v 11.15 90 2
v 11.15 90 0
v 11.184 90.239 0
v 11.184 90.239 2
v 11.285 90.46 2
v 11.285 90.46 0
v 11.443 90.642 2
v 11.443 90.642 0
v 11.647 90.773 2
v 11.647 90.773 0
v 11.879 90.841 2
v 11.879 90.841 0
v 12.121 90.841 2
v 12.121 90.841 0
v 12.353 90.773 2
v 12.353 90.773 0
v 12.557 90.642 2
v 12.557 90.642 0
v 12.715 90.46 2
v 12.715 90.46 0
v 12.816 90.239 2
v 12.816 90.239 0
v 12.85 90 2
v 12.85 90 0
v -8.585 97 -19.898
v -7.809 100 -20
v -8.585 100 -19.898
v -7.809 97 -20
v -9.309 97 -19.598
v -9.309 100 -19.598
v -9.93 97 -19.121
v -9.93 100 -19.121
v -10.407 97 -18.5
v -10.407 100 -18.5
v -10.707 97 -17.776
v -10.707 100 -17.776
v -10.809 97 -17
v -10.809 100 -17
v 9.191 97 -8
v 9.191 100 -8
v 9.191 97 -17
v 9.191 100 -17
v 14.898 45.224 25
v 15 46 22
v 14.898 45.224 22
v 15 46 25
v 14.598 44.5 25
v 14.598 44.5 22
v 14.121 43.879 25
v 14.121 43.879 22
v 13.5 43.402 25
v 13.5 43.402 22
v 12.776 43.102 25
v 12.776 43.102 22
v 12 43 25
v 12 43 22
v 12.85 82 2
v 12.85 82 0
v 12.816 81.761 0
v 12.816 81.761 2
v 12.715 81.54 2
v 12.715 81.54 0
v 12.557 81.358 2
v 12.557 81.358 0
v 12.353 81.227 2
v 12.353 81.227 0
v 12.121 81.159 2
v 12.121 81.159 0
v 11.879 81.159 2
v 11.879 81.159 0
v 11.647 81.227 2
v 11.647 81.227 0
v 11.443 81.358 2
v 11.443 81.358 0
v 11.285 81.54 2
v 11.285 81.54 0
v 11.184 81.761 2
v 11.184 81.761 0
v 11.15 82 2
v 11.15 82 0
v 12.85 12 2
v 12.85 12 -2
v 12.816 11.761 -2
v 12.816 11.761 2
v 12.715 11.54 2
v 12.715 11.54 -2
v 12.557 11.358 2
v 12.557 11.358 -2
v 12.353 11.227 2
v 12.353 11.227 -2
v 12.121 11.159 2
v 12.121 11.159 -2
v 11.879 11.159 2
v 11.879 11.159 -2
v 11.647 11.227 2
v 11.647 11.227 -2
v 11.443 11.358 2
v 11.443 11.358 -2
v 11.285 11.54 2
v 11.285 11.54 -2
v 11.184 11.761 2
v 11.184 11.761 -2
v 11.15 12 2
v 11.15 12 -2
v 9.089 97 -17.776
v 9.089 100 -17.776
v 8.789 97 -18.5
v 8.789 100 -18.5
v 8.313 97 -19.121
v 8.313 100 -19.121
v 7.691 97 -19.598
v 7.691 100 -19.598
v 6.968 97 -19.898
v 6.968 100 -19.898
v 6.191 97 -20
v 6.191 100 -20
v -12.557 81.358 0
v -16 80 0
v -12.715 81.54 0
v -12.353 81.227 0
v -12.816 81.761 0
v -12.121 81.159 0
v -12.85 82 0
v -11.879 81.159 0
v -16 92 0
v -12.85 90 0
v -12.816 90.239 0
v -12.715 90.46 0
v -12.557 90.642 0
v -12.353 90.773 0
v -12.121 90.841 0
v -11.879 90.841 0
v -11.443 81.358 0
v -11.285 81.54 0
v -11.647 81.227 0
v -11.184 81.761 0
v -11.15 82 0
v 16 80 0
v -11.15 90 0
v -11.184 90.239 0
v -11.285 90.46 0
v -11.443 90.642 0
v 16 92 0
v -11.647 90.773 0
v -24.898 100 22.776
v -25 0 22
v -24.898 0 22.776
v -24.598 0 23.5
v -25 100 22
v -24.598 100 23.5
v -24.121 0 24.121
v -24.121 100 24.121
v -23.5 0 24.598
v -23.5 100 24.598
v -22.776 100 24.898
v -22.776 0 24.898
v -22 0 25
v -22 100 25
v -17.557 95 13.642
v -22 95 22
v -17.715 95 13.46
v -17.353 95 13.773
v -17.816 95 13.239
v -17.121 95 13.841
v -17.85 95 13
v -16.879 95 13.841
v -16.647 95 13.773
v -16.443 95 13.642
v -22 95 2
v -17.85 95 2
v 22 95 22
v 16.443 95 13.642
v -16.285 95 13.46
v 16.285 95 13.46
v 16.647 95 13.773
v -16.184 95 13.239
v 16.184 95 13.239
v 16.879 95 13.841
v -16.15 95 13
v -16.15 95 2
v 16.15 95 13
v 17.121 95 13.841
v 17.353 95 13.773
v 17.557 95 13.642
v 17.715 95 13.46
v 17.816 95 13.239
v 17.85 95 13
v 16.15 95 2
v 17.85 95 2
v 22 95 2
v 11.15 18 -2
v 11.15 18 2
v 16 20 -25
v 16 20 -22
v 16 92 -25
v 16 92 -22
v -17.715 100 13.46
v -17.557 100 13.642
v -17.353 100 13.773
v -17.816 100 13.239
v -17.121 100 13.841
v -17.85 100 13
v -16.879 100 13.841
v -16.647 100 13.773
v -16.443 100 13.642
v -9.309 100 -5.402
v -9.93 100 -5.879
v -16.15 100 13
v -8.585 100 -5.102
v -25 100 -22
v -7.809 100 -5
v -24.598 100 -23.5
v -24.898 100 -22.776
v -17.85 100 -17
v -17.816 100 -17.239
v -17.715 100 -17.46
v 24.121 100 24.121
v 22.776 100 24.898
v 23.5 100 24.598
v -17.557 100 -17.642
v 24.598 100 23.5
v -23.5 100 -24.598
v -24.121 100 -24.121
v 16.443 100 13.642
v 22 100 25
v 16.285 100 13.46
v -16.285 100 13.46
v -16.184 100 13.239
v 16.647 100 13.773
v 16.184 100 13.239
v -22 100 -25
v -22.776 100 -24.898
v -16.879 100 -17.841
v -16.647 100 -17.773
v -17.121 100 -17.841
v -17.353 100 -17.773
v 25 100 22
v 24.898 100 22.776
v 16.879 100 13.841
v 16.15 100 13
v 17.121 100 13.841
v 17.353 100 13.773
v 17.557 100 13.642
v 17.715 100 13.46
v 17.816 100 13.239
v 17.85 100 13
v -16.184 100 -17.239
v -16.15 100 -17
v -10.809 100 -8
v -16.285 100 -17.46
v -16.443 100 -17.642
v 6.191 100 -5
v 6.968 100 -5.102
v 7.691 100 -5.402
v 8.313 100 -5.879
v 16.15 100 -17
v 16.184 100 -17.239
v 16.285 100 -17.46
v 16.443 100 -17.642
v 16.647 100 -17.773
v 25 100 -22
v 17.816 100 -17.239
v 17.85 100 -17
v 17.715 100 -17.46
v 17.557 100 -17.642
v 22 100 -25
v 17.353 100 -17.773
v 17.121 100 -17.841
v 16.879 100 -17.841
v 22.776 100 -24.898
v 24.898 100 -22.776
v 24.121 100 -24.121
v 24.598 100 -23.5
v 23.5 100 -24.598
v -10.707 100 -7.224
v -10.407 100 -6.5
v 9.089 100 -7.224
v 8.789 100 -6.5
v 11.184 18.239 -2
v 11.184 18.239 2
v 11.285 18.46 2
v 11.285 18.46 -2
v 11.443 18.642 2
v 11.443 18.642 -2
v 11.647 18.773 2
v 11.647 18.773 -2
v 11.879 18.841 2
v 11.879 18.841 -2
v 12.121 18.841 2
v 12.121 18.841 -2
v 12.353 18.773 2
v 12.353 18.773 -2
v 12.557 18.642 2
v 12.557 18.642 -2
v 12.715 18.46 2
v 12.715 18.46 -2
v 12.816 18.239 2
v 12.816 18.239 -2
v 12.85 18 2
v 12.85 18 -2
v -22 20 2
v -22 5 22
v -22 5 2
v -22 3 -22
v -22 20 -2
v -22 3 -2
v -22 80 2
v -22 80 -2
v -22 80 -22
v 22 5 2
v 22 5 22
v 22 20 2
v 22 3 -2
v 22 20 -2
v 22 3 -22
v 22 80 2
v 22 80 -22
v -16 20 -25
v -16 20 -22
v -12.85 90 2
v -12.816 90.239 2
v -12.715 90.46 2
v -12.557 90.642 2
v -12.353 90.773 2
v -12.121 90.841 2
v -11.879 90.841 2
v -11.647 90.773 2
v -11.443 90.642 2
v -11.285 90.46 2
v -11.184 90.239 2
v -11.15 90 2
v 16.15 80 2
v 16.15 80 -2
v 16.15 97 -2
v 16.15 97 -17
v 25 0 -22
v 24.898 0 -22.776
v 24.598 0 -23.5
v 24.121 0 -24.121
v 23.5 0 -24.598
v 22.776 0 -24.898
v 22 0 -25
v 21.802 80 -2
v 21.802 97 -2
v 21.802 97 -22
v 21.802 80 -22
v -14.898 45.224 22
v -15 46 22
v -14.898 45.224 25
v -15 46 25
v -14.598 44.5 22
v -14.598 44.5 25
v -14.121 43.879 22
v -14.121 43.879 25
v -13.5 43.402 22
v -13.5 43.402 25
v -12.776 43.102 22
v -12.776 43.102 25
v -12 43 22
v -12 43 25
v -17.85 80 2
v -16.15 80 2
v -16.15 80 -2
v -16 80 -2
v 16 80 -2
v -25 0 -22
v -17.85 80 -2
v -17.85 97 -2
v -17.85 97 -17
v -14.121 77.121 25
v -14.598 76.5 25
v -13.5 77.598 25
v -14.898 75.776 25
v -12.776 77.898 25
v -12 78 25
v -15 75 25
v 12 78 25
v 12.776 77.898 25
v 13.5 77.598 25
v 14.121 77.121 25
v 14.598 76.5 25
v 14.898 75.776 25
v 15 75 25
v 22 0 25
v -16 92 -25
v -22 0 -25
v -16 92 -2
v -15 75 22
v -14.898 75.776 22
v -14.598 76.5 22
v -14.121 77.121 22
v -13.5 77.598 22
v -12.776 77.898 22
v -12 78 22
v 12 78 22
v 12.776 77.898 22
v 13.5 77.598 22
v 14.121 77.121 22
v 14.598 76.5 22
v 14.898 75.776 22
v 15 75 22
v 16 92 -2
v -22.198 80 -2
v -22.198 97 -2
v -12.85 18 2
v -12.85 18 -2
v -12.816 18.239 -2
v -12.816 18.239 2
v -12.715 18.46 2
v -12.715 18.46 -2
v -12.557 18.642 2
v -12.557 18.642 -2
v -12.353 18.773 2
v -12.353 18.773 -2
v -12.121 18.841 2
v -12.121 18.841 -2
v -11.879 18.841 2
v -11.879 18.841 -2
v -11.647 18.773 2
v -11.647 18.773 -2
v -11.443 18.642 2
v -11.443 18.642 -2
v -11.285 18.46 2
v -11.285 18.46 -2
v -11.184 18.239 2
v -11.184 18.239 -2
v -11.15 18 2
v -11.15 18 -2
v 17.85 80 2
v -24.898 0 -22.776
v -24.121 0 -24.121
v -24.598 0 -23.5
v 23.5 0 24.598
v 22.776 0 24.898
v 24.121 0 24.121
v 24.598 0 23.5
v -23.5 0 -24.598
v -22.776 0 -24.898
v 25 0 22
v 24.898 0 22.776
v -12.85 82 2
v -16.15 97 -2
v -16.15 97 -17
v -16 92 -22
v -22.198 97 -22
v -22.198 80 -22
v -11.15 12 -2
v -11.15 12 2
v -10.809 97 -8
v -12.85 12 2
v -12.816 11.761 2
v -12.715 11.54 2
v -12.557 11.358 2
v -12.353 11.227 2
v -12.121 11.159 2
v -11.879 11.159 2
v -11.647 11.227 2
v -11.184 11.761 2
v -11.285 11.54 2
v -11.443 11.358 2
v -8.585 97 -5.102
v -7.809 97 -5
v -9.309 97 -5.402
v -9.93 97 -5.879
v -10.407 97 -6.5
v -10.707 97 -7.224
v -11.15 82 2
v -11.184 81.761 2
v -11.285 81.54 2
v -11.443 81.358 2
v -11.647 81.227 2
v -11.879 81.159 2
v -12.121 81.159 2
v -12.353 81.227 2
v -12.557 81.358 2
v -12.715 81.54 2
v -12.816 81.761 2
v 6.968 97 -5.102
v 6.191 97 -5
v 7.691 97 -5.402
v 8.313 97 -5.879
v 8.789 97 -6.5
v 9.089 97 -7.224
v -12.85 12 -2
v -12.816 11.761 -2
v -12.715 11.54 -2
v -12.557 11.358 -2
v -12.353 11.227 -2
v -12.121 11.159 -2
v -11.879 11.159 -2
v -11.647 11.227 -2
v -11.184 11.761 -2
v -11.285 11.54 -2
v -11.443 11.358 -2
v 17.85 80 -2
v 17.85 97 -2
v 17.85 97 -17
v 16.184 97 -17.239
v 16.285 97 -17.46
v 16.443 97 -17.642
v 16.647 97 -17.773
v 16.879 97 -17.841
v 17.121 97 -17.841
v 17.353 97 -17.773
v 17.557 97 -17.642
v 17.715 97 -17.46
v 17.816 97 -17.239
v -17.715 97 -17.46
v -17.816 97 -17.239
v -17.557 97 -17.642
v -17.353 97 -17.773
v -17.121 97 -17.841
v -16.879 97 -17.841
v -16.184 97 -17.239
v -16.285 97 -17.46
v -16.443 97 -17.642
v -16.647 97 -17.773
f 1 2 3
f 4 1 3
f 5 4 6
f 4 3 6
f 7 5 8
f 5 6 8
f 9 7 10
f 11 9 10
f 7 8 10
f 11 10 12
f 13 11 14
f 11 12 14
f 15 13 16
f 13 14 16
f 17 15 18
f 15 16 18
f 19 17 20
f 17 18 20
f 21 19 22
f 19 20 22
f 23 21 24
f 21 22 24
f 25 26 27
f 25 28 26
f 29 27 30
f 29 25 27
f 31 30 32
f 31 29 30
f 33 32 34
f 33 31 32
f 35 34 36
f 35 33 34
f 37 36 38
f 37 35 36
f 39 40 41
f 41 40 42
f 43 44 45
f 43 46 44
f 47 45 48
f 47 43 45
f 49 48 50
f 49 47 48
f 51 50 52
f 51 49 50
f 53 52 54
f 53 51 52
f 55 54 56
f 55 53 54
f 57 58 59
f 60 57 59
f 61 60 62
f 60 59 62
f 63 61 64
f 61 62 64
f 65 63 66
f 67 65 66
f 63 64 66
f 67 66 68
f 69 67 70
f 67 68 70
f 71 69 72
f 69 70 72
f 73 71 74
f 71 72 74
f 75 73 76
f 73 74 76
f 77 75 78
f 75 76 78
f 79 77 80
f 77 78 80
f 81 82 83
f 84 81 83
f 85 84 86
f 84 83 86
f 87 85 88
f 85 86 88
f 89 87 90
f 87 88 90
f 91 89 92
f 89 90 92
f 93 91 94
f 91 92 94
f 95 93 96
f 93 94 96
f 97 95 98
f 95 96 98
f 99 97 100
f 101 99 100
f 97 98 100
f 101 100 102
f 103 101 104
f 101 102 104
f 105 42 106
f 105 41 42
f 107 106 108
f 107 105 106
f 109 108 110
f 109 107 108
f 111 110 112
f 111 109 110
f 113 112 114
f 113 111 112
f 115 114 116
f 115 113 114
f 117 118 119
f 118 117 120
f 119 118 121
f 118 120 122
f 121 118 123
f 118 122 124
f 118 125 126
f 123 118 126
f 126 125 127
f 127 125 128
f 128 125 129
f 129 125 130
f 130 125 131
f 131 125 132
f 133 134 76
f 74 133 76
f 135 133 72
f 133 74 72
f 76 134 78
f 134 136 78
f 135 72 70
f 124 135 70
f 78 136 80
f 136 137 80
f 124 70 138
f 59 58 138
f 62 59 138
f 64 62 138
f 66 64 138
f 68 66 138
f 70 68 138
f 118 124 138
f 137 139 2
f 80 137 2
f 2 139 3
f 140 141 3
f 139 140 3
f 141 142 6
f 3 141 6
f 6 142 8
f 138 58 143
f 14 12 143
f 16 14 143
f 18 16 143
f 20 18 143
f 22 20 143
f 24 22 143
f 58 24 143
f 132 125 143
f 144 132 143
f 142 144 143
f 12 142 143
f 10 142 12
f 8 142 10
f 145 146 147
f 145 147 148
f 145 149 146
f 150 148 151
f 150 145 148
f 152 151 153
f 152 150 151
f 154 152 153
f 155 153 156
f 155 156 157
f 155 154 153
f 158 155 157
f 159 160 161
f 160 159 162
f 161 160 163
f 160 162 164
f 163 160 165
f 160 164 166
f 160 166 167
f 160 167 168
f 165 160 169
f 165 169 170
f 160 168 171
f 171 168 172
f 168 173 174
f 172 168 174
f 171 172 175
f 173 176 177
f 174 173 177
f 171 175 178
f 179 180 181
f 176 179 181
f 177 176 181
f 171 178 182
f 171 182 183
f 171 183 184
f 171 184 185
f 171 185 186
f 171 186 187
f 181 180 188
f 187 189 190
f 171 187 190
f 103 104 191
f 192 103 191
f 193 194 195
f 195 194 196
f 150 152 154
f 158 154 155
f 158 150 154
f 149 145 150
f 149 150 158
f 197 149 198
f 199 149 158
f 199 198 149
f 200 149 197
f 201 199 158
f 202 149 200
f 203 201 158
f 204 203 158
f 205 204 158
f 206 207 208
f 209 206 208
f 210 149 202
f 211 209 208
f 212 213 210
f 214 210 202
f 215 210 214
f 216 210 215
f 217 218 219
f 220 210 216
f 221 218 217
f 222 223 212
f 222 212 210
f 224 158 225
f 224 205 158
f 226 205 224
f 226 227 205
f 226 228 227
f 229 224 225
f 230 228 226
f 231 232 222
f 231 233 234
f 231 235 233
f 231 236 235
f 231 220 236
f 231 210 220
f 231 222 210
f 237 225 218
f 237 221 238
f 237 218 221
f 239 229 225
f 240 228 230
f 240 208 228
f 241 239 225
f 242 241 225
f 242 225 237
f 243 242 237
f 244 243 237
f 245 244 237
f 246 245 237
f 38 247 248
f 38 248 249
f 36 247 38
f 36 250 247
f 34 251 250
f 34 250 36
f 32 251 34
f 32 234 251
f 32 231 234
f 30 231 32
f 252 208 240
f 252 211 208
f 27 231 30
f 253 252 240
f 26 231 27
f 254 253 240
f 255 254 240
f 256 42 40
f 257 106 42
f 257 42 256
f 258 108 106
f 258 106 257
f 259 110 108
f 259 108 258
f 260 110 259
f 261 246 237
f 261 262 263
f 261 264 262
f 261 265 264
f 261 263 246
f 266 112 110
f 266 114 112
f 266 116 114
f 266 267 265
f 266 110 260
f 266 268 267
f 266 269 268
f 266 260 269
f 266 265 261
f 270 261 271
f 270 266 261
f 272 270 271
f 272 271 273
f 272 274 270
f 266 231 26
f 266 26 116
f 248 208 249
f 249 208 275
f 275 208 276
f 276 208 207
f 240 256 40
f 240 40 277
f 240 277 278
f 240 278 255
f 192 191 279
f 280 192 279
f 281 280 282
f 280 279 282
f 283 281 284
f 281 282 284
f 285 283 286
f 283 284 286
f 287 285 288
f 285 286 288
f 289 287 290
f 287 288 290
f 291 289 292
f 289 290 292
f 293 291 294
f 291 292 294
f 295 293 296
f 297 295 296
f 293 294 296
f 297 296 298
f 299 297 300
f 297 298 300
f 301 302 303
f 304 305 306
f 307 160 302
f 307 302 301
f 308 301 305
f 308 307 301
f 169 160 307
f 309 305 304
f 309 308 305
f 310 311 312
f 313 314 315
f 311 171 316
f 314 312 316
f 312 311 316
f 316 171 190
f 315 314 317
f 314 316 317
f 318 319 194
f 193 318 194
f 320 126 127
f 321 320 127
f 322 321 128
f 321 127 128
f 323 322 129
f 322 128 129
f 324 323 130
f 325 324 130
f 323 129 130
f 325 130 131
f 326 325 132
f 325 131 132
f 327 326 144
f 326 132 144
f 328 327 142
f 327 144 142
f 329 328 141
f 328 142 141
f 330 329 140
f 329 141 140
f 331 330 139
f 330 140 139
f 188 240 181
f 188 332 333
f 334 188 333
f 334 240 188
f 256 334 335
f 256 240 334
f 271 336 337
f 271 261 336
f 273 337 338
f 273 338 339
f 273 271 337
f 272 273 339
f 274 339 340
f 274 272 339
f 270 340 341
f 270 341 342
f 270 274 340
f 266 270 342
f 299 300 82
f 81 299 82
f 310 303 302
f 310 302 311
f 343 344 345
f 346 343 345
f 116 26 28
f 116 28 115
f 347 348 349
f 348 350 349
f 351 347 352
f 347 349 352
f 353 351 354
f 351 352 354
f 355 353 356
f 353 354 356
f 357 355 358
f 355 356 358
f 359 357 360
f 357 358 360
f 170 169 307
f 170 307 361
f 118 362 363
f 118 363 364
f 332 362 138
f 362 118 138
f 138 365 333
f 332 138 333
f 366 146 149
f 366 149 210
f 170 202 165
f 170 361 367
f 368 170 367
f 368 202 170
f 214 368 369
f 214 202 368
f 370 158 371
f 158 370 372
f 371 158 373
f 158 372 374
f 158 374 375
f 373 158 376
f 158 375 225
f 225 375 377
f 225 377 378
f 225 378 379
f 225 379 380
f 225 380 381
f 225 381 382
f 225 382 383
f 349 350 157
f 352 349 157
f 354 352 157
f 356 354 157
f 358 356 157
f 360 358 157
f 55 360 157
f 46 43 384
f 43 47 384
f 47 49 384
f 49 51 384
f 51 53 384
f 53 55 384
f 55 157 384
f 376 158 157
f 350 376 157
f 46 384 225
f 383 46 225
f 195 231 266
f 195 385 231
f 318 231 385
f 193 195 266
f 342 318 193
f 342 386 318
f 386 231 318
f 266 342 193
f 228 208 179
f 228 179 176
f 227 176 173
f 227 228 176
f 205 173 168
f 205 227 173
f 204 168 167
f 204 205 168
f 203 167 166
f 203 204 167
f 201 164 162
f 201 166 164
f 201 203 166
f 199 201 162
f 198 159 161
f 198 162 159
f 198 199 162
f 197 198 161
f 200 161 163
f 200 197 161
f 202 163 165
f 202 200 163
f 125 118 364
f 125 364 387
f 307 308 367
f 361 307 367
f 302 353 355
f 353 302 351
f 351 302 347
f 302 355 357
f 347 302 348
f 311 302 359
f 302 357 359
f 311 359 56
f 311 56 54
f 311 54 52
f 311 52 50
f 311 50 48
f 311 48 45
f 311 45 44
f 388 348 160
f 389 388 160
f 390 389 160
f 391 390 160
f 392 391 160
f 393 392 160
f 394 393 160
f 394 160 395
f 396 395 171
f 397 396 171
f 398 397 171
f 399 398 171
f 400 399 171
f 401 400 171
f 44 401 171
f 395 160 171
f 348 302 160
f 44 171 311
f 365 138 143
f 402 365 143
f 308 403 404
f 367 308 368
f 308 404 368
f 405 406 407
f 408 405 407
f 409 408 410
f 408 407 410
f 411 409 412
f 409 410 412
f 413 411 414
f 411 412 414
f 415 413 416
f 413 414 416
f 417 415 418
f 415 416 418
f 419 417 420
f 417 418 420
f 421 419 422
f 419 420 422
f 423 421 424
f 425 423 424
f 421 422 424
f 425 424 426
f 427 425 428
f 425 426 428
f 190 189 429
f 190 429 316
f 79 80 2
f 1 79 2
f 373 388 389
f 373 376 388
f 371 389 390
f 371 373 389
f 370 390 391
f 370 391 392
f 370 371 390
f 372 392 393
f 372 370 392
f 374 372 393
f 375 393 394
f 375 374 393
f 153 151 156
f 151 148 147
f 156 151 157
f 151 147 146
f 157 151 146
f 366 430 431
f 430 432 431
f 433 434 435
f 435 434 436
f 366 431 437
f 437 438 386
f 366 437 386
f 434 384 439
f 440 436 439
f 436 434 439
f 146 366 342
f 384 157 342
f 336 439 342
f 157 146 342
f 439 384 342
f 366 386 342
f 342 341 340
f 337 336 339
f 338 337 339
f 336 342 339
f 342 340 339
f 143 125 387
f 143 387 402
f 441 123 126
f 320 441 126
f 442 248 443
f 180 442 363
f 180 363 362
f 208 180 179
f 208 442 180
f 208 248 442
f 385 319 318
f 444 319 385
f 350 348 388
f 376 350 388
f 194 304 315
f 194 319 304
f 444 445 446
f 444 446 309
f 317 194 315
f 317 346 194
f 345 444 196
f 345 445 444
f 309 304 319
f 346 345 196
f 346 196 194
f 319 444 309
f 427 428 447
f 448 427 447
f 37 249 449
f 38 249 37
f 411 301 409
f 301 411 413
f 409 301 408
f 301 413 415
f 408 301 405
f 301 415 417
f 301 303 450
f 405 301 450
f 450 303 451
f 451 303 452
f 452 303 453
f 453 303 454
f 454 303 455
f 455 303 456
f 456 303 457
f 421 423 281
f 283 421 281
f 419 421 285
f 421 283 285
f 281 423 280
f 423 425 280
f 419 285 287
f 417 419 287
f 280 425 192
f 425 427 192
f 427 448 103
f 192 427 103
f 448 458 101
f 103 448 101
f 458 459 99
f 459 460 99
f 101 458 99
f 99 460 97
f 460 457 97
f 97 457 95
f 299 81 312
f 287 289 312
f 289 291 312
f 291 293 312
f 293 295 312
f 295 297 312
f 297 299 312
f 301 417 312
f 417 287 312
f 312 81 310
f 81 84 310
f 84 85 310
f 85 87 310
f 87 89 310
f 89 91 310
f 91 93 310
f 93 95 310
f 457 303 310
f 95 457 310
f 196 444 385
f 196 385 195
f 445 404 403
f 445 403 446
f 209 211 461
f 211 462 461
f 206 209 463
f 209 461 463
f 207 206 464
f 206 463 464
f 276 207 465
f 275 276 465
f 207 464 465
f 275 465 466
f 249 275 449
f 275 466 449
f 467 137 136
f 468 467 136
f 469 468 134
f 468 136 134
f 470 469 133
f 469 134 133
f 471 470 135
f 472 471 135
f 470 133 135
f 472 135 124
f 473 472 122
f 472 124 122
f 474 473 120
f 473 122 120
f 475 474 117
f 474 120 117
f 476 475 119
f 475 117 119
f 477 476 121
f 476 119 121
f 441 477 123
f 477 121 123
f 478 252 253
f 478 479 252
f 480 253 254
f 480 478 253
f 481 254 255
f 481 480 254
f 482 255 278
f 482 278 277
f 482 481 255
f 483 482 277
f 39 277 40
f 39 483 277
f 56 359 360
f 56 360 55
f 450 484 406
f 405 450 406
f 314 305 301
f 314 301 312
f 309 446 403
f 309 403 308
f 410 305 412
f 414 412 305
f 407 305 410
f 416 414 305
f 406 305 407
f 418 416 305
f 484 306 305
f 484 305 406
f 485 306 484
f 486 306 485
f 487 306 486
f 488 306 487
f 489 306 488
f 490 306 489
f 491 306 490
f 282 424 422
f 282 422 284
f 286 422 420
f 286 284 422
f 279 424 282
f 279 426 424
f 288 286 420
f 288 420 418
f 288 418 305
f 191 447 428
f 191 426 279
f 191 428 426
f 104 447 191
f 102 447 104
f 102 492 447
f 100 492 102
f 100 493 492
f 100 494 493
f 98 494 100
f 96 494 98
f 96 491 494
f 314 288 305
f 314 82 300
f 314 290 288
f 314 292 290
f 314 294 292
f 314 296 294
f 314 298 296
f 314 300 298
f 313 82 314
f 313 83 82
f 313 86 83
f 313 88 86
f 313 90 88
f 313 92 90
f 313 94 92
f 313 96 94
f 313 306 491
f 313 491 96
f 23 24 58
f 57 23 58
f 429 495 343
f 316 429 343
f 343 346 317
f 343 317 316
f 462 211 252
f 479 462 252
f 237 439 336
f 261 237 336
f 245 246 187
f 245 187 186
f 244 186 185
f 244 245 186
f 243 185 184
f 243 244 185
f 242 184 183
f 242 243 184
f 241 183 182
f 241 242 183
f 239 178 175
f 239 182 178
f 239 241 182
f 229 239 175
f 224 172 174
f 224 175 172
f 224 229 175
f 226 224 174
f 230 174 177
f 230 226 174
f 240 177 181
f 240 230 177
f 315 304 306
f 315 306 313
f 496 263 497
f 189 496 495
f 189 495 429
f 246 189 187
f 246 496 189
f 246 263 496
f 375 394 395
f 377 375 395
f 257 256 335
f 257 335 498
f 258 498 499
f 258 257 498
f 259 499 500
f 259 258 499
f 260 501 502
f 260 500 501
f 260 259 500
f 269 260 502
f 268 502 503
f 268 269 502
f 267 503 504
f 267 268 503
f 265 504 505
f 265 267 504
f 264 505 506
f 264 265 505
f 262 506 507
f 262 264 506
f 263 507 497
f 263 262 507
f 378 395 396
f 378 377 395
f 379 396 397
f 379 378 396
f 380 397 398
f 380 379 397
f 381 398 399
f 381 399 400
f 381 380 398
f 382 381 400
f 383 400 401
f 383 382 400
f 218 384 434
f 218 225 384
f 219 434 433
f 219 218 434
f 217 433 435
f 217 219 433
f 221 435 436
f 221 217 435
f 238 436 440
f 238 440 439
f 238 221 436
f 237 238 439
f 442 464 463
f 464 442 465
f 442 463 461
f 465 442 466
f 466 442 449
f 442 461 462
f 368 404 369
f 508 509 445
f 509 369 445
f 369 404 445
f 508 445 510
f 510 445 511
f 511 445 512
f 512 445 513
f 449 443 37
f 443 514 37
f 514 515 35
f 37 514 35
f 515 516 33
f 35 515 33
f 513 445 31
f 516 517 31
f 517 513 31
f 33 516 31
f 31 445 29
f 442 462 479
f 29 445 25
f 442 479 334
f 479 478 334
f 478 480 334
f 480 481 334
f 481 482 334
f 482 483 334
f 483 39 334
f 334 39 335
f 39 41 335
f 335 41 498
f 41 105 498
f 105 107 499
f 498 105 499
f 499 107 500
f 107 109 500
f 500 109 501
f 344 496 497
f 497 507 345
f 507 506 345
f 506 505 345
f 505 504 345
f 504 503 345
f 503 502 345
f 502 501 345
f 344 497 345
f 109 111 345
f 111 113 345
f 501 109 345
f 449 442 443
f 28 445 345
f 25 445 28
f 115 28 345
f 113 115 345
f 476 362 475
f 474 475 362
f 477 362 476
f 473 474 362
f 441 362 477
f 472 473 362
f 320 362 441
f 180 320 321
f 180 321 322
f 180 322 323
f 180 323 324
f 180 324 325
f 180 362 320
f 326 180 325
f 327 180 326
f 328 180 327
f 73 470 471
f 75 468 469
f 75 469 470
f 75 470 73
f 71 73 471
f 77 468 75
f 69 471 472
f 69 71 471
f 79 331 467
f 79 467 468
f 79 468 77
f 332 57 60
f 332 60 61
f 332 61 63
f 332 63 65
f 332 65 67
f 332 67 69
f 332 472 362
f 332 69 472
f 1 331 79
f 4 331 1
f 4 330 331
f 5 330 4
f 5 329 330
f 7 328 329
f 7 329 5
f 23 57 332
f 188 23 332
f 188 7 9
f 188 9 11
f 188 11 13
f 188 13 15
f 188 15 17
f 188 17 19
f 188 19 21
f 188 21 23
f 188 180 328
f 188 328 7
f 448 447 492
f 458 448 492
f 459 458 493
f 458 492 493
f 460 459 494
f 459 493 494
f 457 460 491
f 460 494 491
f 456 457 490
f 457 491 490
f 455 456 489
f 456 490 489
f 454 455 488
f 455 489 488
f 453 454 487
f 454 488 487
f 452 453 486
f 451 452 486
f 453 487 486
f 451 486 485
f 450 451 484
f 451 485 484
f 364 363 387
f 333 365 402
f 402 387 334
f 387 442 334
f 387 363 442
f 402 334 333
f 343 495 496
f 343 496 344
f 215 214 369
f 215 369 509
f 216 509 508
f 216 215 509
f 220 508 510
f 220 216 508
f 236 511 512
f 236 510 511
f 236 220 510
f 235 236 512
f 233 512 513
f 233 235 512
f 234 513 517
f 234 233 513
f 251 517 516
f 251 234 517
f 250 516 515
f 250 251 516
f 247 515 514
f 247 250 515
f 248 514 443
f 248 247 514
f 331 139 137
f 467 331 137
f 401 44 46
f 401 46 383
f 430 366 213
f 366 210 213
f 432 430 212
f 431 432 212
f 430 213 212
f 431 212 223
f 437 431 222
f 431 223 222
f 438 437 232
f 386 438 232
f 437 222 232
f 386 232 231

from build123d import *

# Parameters (mm, degrees)
SKETCH_1_W                = 50
SKETCH_1_H                = 50
EXTRUDE_2_DEPTH           = 100
FILLET_4_R                = 3
SKETCH_3_W                = 44
SKETCH_3_H                = 44
CUT_EXTRUDE_4_DEPTH       = 80
SKETCH_3_4_W              = 44
SKETCH_3_4_H              = 44
EXTRUDE_4_DEPTH           = 20
SKETCH_7_W                = 44
SKETCH_7_H                = 20
CUT_EXTRUDE_5_DEPTH       = 20
SKETCH_7_2_W              = 44
SKETCH_7_2_H              = 20
EXTRUDE_5_DEPTH           = 5
SKETCH_9_W                = 44
SKETCH_9_H                = 20
CUT_EXTRUDE_6_DEPTH       = 20
SKETCH_9_2_W              = 44
SKETCH_9_2_H              = 20
EXTRUDE_6_DEPTH           = 3
CUT_EXTRUDE_7_DEPTH       = 5
CUT_EXTRUDE_7_DEPTH_BACK  = 5
SKETCH_15_W               = 44
SKETCH_15_H               = 20
CUT_EXTRUDE_9_DEPTH       = 41
SKETCH_15_2_W             = 44
SKETCH_15_2_H             = 20
EXTRUDE_7_DEPTH           = 15
SKETCH_15_3_W             = 44
SKETCH_15_3_H             = 20
CUT_EXTRUDE_10_DEPTH      = 10
SKETCH_16_W               = 44
SKETCH_16_H               = 20
CUT_EXTRUDE_11_DEPTH      = 30
SKETCH_16_2_W             = 44
SKETCH_16_2_H             = 20
EXTRUDE_8_DEPTH           = 13
SKETCH_16_3_W             = 44
SKETCH_16_3_H             = 20
CUT_EXTRUDE_12_DEPTH      = 10
CUT_EXTRUDE_17_DEPTH      = 40
CUT_EXTRUDE_18_DEPTH      = 5
CUT_EXTRUDE_18_DEPTH_BACK = 4
SKETCH_21_W               = 20
SKETCH_21_H               = 15
CUT_EXTRUDE_19_DEPTH      = 44
SKETCH_23_W               = 32
SKETCH_23_H               = 72
CUT_EXTRUDE_20_DEPTH      = 44
SKETCH_25_W               = 30
SKETCH_25_H               = 35
CUT_EXTRUDE_21_DEPTH      = 40
FILLET_5_R                = 3
FILLET_6_R                = 3


with BuildPart() as part:
    # 草图1 → 凸台-拉伸2 (new body)
    with BuildSketch(Plane(origin=(0, 0, 0), x_dir=(1, 0, 0), z_dir=(0, 1, 0))):
        Rectangle(SKETCH_1_W, SKETCH_1_H)
    extrude(amount=EXTRUDE_2_DEPTH)

    # 圆角4
    fillet_4_edges = [part.edges().sort_by_distance(p)[0] for p in [
        (-25, 50, 25),
        (-25, 50, -25),
        (25, 50, -25),
        (25, 50, 25),
    ]]
    fillet(fillet_4_edges, radius=FILLET_4_R)

    # 草图3 → 切除-拉伸4 (cut)
    with BuildSketch(Plane(origin=(0, 0, 0), x_dir=(1, 0, 0), z_dir=(0, 1, 0))):
        Rectangle(SKETCH_3_W, SKETCH_3_H)
    extrude(amount=CUT_EXTRUDE_4_DEPTH, mode=Mode.SUBTRACT)

    # 草图3<4> → 凸台-拉伸4 (add)
    with BuildSketch(Plane(origin=(0, 0, 0), x_dir=(1, 0, 0), z_dir=(0, 1, 0))):
        Rectangle(SKETCH_3_4_W, SKETCH_3_4_H)
    extrude(amount=EXTRUDE_4_DEPTH)

    # 草图7 → 切除-拉伸5 (cut)
    with BuildSketch(Plane(origin=(0, 0, 0), x_dir=(1, 0, 0), z_dir=(0, 1, 0))):
        with Locations((0, -12)):
            Rectangle(SKETCH_7_W, SKETCH_7_H)
    extrude(amount=CUT_EXTRUDE_5_DEPTH, mode=Mode.SUBTRACT)

    # 草图7<2> → 凸台-拉伸5 (add)
    with BuildSketch(Plane(origin=(0, 0, 0), x_dir=(1, 0, 0), z_dir=(0, 1, 0))):
        with Locations((0, -12)):
            Rectangle(SKETCH_7_2_W, SKETCH_7_2_H)
    extrude(amount=EXTRUDE_5_DEPTH)

    # 草图9 → 切除-拉伸6 (cut)
    with BuildSketch(Plane(origin=(0, 0, 0), x_dir=(1, 0, 0), z_dir=(0, 1, 0))):
        with Locations((0, 12)):
            Rectangle(SKETCH_9_W, SKETCH_9_H)
    extrude(amount=CUT_EXTRUDE_6_DEPTH, mode=Mode.SUBTRACT)

    # 草图9<2> → 凸台-拉伸6 (add)
    with BuildSketch(Plane(origin=(0, 0, 0), x_dir=(1, 0, 0), z_dir=(0, 1, 0))):
        with Locations((0, 12)):
            Rectangle(SKETCH_9_2_W, SKETCH_9_2_H)
    extrude(amount=EXTRUDE_6_DEPTH)

    # 草图10 → 切除-拉伸7 (cut, two sides: drawn at the far end of the back side and taken through both)
    with BuildSketch(Plane.XY.offset(-CUT_EXTRUDE_7_DEPTH_BACK)):
        with BuildLine():
            Line((-11.15, 18), (-11.15, 12))
            ThreePointArc((-11.15, 12), (-12, 11.15), (-12.85, 12))
            Line((-12.85, 12), (-12.85, 18))
            ThreePointArc((-12.85, 18), (-12, 18.85), (-11.15, 18))
        make_face()
        with BuildLine():
            Line((12.85, 18), (12.85, 12))
            ThreePointArc((12.85, 12), (12, 11.15), (11.15, 12))
            Line((11.15, 12), (11.15, 18))
            ThreePointArc((11.15, 18), (12, 18.85), (12.85, 18))
        make_face()
    extrude(amount=CUT_EXTRUDE_7_DEPTH + CUT_EXTRUDE_7_DEPTH_BACK, mode=Mode.SUBTRACT)

    # 草图15 → 切除-拉伸9 (cut)
    with BuildSketch(Plane(origin=(0, 110, 0), x_dir=(1, 0, 0), z_dir=(0, 1, 0))):
        with Locations((0, -12)):
            Rectangle(SKETCH_15_W, SKETCH_15_H)
    extrude(amount=-CUT_EXTRUDE_9_DEPTH, mode=Mode.SUBTRACT)

    # 草图15<2> → 凸台-拉伸7 (add)
    with BuildSketch(Plane(origin=(0, 110, 0), x_dir=(1, 0, 0), z_dir=(0, 1, 0))):
        with Locations((0, -12)):
            Rectangle(SKETCH_15_2_W, SKETCH_15_2_H)
    extrude(amount=-EXTRUDE_7_DEPTH)

    # 草图15<3> → 切除-拉伸10 (cut)
    with BuildSketch(Plane(origin=(0, 110, 0), x_dir=(1, 0, 0), z_dir=(0, 1, 0))):
        with Locations((0, -12)):
            Rectangle(SKETCH_15_3_W, SKETCH_15_3_H)
    extrude(amount=-CUT_EXTRUDE_10_DEPTH, mode=Mode.SUBTRACT)

    # 草图16 → 切除-拉伸11 (cut)
    with BuildSketch(Plane(origin=(0, 110, 0), x_dir=(1, 0, 0), z_dir=(0, 1, 0))):
        with Locations((-0.197660017, 12)):
            Rectangle(SKETCH_16_W, SKETCH_16_H)
    extrude(amount=-CUT_EXTRUDE_11_DEPTH, mode=Mode.SUBTRACT)

    # 草图16<2> → 凸台-拉伸8 (add)
    with BuildSketch(Plane(origin=(0, 110, 0), x_dir=(1, 0, 0), z_dir=(0, 1, 0))):
        with Locations((-0.197660017, 12)):
            Rectangle(SKETCH_16_2_W, SKETCH_16_2_H)
    extrude(amount=-EXTRUDE_8_DEPTH)

    # 草图16<3> → 切除-拉伸12 (cut)
    with BuildSketch(Plane(origin=(0, 110, 0), x_dir=(1, 0, 0), z_dir=(0, 1, 0))):
        with Locations((-0.197660017, 12)):
            Rectangle(SKETCH_16_3_W, SKETCH_16_3_H)
    extrude(amount=-CUT_EXTRUDE_12_DEPTH, mode=Mode.SUBTRACT)

    # 草图11 → 切除-拉伸17 (cut)
    with BuildSketch(Plane(origin=(0, 110, 0), x_dir=(1, 0, 0), z_dir=(0, 1, 0))):
        with BuildLine():
            Line((-16.15, 17), (-16.15, -13))
            ThreePointArc((-16.15, -13), (-17, -13.85), (-17.85, -13))
            Line((-17.85, -13), (-17.85, 17))
            ThreePointArc((-17.85, 17), (-17, 17.85), (-16.15, 17))
        make_face()
        with BuildLine():
            Line((17.85, 17), (17.85, -13))
            ThreePointArc((17.85, -13), (17, -13.85), (16.15, -13))
            Line((16.15, -13), (16.15, 17))
            ThreePointArc((16.15, 17), (17, 17.85), (17.85, 17))
        make_face()
    extrude(amount=-CUT_EXTRUDE_17_DEPTH, mode=Mode.SUBTRACT)

    # 草图20 → 切除-拉伸18 (cut, two sides: drawn at the far end of the back side and taken through both)
    with BuildSketch(Plane.XY.offset(-CUT_EXTRUDE_18_DEPTH_BACK)):
        with BuildLine():
            Line((-11.15, 90), (-11.15, 82))
            ThreePointArc((-11.15, 82), (-12, 81.15), (-12.85, 82))
            Line((-12.85, 82), (-12.85, 90))
            ThreePointArc((-12.85, 90), (-12, 90.85), (-11.15, 90))
        make_face()
        with BuildLine():
            Line((12.85, 90), (12.85, 82))
            ThreePointArc((12.85, 82), (12, 81.15), (11.15, 82))
            Line((11.15, 82), (11.15, 90))
            ThreePointArc((11.15, 90), (12, 90.85), (12.85, 90))
        make_face()
    extrude(amount=CUT_EXTRUDE_18_DEPTH + CUT_EXTRUDE_18_DEPTH_BACK, mode=Mode.SUBTRACT)

    # 草图21 → 切除-拉伸19 (cut)
    with BuildSketch(Plane(origin=(0, 110, 0), x_dir=(1, 0, 0), z_dir=(0, 1, 0))):
        with Locations((-0.808809207, 12.5)):
            Rectangle(SKETCH_21_W, SKETCH_21_H)
    extrude(amount=-CUT_EXTRUDE_19_DEPTH, mode=Mode.SUBTRACT)

    # 草图23 → 切除-拉伸20 (cut)
    with BuildSketch(Plane.XY):
        with Locations((0, 56)):
            Rectangle(SKETCH_23_W, SKETCH_23_H)
    extrude(amount=-CUT_EXTRUDE_20_DEPTH, mode=Mode.SUBTRACT)

    # 草图25 → 切除-拉伸21 (cut)
    with BuildSketch(Plane.XY):
        with Locations((0, 60.5)):
            Rectangle(SKETCH_25_W, SKETCH_25_H)
    extrude(amount=CUT_EXTRUDE_21_DEPTH, mode=Mode.SUBTRACT)

    # 圆角5
    fillet_5_edges = [part.edges().sort_by_distance(p)[0] for p in [
        (-15, 78, 23.5),
        (-15, 43, 23.5),
        (15, 43, 23.5),
        (15, 78, 23.5),
    ]]
    fillet(fillet_5_edges, radius=FILLET_5_R)

    # 圆角6
    fillet_6_edges = [part.edges().sort_by_distance(p)[0] for p in [
        (-10.808809207, 98.5, -5),
        (-10.808809207, 98.5, -20),
        (9.191190793, 98.5, -20),
        (9.191190793, 98.5, -5),
    ]]
    fillet(fillet_6_edges, radius=FILLET_6_R)


solid = part.part
